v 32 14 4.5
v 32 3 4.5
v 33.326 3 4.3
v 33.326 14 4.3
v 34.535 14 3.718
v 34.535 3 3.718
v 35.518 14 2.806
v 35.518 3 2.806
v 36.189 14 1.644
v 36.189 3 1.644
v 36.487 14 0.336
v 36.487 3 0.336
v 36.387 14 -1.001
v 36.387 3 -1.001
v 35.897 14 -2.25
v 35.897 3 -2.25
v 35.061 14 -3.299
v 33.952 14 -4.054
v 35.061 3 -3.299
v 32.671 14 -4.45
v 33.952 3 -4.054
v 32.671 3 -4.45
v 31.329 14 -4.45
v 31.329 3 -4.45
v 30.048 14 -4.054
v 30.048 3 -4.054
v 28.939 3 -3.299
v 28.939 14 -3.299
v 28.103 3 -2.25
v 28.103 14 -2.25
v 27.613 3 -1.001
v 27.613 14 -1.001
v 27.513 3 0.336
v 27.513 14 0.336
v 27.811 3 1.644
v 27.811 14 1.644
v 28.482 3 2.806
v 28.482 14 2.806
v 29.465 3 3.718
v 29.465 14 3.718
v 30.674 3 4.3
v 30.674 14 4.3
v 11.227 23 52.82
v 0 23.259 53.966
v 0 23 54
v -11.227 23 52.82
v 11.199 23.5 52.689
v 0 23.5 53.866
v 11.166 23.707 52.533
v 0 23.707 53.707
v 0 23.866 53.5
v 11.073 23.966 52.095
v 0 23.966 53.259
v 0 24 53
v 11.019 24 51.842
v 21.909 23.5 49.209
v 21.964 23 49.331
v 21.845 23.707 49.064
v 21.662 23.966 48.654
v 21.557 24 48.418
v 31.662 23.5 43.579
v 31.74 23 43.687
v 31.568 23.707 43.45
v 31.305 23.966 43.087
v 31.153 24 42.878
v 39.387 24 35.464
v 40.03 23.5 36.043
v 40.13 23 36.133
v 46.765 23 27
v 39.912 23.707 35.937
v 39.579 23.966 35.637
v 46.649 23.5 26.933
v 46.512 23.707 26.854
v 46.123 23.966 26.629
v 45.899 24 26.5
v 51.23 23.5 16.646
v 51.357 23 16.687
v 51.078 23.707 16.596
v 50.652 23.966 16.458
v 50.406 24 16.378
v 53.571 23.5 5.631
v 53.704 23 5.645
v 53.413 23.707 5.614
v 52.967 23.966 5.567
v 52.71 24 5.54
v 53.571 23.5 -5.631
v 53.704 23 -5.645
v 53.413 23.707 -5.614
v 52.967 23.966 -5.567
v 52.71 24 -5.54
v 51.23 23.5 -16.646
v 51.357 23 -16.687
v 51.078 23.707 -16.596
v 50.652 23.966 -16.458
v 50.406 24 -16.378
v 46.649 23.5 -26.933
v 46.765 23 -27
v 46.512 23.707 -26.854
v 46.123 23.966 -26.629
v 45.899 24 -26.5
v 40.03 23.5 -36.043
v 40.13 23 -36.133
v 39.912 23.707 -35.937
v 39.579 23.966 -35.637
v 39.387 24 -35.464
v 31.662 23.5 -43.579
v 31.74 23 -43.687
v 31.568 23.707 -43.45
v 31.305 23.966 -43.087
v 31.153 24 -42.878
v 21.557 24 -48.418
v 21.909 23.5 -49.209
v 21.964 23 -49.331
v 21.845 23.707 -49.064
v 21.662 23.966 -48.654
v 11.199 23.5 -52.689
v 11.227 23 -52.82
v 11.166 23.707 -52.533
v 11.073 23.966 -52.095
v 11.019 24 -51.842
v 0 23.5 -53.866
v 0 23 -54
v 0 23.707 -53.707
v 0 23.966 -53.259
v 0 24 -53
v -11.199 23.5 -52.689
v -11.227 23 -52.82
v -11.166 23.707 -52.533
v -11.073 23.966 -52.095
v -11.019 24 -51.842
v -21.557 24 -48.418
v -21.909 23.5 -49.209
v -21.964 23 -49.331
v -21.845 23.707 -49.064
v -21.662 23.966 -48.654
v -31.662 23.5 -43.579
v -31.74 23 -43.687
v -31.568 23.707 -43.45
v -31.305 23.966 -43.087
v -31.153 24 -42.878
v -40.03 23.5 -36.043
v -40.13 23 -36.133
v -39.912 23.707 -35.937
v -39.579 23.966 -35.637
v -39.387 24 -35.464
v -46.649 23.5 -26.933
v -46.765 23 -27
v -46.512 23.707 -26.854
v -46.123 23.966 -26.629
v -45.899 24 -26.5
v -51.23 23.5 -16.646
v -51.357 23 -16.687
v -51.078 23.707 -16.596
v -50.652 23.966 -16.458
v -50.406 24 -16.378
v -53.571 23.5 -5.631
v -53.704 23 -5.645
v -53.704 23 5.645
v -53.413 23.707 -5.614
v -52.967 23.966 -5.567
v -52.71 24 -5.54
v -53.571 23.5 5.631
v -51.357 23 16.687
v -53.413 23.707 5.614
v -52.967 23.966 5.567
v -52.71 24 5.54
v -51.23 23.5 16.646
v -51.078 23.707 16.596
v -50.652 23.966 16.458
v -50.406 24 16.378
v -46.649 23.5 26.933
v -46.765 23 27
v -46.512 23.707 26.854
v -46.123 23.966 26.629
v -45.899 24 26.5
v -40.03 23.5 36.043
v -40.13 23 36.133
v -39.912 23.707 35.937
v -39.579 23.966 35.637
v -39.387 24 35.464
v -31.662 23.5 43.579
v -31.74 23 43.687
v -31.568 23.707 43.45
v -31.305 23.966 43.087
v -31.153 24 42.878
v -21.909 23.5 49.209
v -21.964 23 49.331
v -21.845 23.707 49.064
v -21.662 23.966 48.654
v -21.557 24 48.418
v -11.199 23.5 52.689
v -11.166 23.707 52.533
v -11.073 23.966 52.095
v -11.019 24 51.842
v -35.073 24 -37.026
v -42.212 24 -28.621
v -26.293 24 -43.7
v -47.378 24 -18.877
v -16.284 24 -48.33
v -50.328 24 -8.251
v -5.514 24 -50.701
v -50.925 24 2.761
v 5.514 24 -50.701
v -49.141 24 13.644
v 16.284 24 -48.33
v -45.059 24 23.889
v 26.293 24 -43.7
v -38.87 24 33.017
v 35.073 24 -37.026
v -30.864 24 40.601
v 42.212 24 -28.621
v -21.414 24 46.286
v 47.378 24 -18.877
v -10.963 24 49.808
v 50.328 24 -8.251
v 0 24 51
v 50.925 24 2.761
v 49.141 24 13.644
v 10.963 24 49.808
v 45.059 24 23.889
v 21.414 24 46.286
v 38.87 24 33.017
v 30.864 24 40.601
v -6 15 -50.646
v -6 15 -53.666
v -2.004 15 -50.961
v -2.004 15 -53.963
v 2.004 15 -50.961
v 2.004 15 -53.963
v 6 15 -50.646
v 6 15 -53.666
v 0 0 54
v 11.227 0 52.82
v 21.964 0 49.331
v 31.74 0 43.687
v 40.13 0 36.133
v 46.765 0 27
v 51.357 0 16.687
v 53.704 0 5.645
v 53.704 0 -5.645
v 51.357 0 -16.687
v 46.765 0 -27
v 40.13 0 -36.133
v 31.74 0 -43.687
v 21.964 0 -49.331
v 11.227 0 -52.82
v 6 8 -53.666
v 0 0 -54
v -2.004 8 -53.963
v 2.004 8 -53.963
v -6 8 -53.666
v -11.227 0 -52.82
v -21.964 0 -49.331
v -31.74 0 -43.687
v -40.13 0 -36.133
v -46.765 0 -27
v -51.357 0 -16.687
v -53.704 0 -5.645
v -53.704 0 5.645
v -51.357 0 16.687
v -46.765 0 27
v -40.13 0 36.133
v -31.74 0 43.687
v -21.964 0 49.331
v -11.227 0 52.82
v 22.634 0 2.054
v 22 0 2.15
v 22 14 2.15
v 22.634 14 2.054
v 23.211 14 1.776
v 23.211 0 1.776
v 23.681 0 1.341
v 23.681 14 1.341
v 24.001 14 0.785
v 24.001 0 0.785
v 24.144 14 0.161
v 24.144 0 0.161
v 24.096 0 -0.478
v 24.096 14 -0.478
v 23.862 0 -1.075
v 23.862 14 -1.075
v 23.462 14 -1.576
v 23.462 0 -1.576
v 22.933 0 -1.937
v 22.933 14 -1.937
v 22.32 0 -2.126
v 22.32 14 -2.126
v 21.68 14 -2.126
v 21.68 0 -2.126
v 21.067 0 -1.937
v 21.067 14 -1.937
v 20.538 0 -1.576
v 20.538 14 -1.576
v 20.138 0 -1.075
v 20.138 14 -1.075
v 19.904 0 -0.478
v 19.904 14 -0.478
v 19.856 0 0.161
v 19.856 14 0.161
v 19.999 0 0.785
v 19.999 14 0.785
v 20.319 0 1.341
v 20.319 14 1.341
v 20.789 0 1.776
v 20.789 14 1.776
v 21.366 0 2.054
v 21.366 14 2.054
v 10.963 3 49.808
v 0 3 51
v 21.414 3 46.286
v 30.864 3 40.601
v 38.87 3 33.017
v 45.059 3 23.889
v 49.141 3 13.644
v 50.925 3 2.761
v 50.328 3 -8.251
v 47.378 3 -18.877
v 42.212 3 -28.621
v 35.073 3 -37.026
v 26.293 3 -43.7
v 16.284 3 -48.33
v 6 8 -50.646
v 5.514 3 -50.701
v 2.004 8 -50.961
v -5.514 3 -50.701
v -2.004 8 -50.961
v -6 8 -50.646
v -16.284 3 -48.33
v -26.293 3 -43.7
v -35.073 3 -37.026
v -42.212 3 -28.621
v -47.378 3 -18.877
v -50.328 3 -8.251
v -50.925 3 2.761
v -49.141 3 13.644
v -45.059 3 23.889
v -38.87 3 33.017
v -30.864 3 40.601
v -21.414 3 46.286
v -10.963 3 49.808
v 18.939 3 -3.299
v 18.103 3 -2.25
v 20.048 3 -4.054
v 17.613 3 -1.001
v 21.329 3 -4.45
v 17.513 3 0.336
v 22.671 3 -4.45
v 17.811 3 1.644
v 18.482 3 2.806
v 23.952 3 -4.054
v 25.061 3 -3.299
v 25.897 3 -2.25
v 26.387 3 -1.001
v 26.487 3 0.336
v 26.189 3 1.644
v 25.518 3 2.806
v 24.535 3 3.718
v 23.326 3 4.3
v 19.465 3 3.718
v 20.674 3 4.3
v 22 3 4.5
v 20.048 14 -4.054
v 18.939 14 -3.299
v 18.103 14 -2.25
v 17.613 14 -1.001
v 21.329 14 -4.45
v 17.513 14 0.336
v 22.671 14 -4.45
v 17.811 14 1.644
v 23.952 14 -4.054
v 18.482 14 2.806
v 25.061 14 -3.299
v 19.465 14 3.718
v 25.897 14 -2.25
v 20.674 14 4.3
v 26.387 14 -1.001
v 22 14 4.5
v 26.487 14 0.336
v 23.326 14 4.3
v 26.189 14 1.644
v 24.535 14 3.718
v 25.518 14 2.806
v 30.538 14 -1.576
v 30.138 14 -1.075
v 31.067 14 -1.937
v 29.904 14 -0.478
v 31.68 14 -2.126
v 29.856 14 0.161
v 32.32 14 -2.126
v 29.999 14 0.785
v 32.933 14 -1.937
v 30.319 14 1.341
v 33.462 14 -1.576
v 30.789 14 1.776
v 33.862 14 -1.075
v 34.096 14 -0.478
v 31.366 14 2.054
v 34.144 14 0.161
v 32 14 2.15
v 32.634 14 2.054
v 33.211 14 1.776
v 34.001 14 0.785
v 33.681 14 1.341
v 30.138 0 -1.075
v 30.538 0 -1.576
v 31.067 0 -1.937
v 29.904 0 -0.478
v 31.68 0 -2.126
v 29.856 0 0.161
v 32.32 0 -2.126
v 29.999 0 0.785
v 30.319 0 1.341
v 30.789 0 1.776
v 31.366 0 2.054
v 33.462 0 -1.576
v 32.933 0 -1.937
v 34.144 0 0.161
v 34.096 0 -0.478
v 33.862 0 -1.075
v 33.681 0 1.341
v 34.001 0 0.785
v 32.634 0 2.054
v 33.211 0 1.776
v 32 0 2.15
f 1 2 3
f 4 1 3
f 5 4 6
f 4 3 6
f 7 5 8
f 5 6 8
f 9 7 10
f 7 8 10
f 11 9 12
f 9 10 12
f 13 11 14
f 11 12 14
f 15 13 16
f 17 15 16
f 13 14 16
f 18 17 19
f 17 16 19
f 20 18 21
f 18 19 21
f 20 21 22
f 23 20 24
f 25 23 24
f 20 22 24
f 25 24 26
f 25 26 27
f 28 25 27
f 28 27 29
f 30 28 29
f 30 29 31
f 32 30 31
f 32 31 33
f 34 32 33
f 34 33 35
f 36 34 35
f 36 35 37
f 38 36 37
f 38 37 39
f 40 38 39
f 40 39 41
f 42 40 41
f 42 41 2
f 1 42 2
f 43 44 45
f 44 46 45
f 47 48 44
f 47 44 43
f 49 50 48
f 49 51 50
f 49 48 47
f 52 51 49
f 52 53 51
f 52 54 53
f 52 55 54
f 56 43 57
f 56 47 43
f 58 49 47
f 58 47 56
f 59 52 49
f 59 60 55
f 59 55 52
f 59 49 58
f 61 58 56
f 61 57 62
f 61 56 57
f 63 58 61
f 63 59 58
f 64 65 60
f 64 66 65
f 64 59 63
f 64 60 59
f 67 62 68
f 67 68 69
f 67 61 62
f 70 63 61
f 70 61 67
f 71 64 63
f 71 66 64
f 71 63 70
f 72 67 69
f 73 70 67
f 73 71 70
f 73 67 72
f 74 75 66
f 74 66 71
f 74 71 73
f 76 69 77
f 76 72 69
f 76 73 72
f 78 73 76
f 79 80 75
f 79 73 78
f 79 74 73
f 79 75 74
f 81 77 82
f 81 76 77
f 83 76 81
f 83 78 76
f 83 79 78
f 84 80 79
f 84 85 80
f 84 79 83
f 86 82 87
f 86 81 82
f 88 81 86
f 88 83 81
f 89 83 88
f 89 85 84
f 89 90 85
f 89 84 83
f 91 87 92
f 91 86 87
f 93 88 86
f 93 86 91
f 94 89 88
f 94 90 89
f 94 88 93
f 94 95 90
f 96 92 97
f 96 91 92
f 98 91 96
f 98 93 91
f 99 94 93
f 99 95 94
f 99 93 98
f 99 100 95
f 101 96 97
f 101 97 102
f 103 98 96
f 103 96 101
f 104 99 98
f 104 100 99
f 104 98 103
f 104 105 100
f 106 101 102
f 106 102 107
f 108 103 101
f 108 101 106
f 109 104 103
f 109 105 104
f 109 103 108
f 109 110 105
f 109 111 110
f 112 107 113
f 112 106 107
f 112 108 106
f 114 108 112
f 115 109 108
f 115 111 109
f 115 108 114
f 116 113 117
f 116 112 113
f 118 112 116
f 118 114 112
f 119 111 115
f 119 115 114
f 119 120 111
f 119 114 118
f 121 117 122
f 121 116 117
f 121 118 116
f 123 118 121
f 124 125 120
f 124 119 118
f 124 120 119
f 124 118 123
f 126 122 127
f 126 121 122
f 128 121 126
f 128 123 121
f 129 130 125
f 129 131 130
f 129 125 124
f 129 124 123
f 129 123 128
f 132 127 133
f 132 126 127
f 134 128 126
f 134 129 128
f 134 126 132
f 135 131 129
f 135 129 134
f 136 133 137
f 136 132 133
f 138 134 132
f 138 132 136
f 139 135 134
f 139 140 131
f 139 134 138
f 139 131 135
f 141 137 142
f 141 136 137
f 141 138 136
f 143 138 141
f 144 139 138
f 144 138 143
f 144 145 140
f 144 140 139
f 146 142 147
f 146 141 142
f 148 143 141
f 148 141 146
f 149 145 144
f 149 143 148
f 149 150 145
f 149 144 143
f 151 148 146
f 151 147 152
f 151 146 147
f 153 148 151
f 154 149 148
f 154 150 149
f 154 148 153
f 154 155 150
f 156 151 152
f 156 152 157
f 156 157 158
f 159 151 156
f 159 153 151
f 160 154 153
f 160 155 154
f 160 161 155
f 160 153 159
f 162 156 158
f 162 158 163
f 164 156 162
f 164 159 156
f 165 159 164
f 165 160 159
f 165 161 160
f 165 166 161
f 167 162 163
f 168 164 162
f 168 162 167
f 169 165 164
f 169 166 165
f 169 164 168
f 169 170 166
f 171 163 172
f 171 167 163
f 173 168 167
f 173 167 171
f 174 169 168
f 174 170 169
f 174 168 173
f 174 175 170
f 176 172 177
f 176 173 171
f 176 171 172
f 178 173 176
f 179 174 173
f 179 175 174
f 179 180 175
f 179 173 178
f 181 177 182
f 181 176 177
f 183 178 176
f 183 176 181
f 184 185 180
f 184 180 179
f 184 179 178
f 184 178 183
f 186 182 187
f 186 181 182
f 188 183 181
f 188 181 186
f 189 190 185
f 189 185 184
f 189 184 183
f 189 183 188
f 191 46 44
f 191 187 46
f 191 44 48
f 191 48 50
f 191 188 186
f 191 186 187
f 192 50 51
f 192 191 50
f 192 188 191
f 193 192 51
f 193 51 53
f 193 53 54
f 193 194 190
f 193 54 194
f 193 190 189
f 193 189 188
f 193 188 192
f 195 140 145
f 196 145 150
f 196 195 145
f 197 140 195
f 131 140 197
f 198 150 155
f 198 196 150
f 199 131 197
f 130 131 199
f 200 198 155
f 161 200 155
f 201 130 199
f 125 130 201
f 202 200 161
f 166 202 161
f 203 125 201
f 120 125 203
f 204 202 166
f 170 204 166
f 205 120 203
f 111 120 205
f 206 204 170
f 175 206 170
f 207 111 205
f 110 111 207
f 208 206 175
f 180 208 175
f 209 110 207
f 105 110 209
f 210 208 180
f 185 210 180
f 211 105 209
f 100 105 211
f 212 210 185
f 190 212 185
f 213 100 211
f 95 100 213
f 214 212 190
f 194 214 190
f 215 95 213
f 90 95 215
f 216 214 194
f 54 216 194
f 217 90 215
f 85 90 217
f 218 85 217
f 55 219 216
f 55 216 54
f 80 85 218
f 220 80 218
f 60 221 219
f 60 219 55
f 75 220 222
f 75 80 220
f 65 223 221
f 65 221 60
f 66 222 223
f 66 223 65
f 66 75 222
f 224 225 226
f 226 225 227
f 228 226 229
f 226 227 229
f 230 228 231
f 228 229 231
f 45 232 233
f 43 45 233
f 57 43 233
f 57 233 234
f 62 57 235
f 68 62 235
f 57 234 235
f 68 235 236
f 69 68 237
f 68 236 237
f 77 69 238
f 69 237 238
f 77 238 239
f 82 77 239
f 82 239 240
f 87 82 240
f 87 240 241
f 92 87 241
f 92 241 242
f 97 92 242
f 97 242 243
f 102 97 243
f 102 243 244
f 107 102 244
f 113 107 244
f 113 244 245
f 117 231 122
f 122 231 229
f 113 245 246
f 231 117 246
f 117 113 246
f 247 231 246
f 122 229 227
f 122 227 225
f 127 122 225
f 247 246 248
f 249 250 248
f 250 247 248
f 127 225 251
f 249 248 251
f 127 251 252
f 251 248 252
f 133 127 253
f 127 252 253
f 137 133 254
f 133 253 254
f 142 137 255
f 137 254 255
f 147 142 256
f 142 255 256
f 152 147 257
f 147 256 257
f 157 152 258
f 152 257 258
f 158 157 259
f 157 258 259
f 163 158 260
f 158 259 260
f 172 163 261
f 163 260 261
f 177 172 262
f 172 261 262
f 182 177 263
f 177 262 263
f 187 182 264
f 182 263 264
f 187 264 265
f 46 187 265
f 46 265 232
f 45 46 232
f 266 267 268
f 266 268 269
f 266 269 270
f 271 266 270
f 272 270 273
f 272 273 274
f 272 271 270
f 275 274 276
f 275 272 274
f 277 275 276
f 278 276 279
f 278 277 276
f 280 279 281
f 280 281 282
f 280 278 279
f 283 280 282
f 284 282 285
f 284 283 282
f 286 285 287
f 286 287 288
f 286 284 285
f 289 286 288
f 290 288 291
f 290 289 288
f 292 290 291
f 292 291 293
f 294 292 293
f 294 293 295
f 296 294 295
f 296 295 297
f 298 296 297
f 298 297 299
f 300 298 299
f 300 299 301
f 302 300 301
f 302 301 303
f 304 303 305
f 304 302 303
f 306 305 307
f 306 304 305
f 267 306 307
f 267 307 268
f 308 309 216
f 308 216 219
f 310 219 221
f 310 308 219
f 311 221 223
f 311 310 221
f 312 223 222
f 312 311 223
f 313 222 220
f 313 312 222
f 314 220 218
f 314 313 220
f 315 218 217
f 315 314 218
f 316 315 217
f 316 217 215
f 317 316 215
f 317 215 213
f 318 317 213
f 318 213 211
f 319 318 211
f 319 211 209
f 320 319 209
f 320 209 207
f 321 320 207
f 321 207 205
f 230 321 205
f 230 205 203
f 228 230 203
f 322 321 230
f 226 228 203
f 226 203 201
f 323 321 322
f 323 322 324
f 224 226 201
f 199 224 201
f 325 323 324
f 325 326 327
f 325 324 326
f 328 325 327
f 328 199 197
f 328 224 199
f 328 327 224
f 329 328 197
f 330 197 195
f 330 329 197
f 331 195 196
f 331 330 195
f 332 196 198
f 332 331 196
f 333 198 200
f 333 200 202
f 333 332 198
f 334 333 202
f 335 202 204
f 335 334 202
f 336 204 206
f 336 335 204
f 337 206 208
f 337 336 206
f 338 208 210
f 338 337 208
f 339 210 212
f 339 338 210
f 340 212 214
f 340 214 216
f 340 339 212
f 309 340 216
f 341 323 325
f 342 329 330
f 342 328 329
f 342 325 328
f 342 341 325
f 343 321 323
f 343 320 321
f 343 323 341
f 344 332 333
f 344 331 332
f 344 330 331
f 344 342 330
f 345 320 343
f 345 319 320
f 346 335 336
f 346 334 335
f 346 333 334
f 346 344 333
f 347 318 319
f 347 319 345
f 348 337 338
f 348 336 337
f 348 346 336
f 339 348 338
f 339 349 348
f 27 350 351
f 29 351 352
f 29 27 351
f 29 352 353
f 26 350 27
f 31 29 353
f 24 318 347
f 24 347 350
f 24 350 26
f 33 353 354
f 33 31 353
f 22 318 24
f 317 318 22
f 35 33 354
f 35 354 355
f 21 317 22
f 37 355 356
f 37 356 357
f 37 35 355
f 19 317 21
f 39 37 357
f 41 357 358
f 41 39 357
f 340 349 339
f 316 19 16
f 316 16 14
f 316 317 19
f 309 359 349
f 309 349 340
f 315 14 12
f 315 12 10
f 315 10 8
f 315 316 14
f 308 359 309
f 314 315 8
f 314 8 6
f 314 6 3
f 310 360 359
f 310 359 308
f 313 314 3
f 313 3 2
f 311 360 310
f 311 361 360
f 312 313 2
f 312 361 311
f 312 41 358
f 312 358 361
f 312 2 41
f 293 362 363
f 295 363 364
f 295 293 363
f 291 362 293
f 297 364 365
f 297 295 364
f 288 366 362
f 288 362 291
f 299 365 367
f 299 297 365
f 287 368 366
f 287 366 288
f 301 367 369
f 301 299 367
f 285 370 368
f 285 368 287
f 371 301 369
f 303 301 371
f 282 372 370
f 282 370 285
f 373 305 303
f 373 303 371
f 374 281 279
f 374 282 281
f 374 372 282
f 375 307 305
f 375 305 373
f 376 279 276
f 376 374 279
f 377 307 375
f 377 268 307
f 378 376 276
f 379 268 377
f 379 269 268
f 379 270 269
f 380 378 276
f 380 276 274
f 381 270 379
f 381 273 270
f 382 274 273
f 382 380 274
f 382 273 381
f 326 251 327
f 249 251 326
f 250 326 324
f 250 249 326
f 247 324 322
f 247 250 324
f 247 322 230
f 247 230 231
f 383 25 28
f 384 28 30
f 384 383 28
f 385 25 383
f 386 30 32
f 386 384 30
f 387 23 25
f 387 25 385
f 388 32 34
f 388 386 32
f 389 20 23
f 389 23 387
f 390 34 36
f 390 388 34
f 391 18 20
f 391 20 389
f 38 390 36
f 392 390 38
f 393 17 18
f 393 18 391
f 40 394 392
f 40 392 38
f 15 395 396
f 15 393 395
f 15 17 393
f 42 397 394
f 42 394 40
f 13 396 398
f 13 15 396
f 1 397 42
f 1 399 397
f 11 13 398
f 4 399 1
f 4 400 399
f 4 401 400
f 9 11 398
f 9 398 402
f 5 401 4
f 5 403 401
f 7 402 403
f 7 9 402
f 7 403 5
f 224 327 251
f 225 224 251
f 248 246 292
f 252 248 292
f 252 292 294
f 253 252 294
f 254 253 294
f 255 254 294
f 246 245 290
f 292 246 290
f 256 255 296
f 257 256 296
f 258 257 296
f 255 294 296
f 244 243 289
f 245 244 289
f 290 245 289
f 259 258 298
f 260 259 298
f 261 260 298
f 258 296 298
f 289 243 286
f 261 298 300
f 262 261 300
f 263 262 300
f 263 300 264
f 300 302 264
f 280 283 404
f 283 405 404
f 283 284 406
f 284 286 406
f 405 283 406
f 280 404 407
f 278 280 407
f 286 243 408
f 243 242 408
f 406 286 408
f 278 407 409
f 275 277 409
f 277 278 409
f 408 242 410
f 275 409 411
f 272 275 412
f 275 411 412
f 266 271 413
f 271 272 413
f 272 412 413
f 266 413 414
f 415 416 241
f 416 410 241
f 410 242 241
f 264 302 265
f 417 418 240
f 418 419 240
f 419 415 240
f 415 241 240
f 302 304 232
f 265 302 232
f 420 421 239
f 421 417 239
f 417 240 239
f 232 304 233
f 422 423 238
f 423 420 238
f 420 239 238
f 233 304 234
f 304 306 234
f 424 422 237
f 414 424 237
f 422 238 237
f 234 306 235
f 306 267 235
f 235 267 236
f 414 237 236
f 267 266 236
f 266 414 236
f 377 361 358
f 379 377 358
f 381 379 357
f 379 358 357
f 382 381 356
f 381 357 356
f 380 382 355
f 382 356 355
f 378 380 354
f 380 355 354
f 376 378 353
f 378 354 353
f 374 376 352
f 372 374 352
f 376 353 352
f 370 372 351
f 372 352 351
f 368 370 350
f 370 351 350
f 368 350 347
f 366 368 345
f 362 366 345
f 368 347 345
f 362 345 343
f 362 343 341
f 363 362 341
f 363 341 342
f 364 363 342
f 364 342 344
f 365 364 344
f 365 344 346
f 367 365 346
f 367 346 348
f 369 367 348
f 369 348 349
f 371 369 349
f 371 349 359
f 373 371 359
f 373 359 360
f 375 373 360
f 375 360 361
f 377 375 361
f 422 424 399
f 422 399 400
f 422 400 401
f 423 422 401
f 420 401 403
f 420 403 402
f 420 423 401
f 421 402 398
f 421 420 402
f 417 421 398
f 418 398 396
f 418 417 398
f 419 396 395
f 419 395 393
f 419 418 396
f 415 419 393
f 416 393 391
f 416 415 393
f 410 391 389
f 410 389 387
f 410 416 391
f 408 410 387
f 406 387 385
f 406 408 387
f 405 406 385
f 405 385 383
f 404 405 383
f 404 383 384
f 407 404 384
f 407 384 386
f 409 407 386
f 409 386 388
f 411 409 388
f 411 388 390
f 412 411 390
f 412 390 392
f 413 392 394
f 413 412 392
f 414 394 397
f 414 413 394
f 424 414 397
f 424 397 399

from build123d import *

# Parameters (mm, degrees)
SKETCH_1_R                     = 54
FLOOR_D108_T3_DEPTH            = 3
SKETCH_2_R                     = 54
SKETCH_2_R_2                   = 51
RIM_OD108_ID102_H24_DEPTH      = 24
SKETCH_3_R                     = 4.5
SENSOR_FIXED_POSTS_DEPTH       = 14
SKETCH_4_R                     = 2.15
M4_FIXED_MOUNT_CLEARANCE_DEPTH = 14
SKETCH_5_W                     = 12
SKETCH_5_H                     = 11
USB_C_SIDE_OPENING_12X7_DEPTH  = 7
BASE_OUTER_ROUND_R1_R          = 1


with BuildPart() as part:
    # 草图1 → Floor_D108_T3 (new body)
    with BuildSketch(Plane(origin=(0, 0, 0), x_dir=(1, 0, 0), z_dir=(0, 1, 0))):
        with Locations(Location((0, 0, 0), (0, 0, 270))):
            Circle(SKETCH_1_R)
    extrude(amount=FLOOR_D108_T3_DEPTH)

    # 草图2 → Rim_OD108_ID102_H24 (add)
    with BuildSketch(Plane(origin=(0, 0, 0), x_dir=(1, 0, 0), z_dir=(0, 1, 0))):
        with Locations(Location((0, 0, 0), (0, 0, 270))):
            Circle(SKETCH_2_R)
        with Locations(Location((0, 0, 0), (0, 0, 270))):
            Circle(SKETCH_2_R_2, mode=Mode.SUBTRACT)
    extrude(amount=RIM_OD108_ID102_H24_DEPTH)

    # 草图3 → Sensor_fixed_posts (add)
    with BuildSketch(Plane(origin=(0, 0, 0), x_dir=(1, 0, 0), z_dir=(0, 1, 0))):
        with Locations(Location((22, 0, 0), (0, 0, 270))):
            Circle(SKETCH_3_R)
        with Locations(Location((32, 0, 0), (0, 0, 270))):
            Circle(SKETCH_3_R)
    extrude(amount=SENSOR_FIXED_POSTS_DEPTH)

    # 草图4 → M4_fixed_mount_clearance (cut)
    with BuildSketch(Plane(origin=(0, 0, 0), x_dir=(1, 0, 0), z_dir=(0, 1, 0))):
        with Locations(Location((22, 0, 0), (0, 0, 270))):
            Circle(SKETCH_4_R)
        with Locations(Location((32, 0, 0), (0, 0, 270))):
            Circle(SKETCH_4_R)
    extrude(amount=M4_FIXED_MOUNT_CLEARANCE_DEPTH, mode=Mode.SUBTRACT)

    # 草图5 → USB_C_side_opening_12x7 (cut)
    with BuildSketch(Plane(origin=(0, 8, 0), x_dir=(1, 0, 0), z_dir=(0, 1, 0))):
        with Locations((0, 54.5)):
            Rectangle(SKETCH_5_W, SKETCH_5_H)
    extrude(amount=USB_C_SIDE_OPENING_12X7_DEPTH, mode=Mode.SUBTRACT)

    # Base_outer_round_R1
    base_outer_round_r1_edges = [part.edges().sort_by_distance(p)[0] for p in [
        (0, 24, -54),
    ]]
    fillet(base_outer_round_r1_edges, radius=BASE_OUTER_ROUND_R1_R)


solid = part.part
